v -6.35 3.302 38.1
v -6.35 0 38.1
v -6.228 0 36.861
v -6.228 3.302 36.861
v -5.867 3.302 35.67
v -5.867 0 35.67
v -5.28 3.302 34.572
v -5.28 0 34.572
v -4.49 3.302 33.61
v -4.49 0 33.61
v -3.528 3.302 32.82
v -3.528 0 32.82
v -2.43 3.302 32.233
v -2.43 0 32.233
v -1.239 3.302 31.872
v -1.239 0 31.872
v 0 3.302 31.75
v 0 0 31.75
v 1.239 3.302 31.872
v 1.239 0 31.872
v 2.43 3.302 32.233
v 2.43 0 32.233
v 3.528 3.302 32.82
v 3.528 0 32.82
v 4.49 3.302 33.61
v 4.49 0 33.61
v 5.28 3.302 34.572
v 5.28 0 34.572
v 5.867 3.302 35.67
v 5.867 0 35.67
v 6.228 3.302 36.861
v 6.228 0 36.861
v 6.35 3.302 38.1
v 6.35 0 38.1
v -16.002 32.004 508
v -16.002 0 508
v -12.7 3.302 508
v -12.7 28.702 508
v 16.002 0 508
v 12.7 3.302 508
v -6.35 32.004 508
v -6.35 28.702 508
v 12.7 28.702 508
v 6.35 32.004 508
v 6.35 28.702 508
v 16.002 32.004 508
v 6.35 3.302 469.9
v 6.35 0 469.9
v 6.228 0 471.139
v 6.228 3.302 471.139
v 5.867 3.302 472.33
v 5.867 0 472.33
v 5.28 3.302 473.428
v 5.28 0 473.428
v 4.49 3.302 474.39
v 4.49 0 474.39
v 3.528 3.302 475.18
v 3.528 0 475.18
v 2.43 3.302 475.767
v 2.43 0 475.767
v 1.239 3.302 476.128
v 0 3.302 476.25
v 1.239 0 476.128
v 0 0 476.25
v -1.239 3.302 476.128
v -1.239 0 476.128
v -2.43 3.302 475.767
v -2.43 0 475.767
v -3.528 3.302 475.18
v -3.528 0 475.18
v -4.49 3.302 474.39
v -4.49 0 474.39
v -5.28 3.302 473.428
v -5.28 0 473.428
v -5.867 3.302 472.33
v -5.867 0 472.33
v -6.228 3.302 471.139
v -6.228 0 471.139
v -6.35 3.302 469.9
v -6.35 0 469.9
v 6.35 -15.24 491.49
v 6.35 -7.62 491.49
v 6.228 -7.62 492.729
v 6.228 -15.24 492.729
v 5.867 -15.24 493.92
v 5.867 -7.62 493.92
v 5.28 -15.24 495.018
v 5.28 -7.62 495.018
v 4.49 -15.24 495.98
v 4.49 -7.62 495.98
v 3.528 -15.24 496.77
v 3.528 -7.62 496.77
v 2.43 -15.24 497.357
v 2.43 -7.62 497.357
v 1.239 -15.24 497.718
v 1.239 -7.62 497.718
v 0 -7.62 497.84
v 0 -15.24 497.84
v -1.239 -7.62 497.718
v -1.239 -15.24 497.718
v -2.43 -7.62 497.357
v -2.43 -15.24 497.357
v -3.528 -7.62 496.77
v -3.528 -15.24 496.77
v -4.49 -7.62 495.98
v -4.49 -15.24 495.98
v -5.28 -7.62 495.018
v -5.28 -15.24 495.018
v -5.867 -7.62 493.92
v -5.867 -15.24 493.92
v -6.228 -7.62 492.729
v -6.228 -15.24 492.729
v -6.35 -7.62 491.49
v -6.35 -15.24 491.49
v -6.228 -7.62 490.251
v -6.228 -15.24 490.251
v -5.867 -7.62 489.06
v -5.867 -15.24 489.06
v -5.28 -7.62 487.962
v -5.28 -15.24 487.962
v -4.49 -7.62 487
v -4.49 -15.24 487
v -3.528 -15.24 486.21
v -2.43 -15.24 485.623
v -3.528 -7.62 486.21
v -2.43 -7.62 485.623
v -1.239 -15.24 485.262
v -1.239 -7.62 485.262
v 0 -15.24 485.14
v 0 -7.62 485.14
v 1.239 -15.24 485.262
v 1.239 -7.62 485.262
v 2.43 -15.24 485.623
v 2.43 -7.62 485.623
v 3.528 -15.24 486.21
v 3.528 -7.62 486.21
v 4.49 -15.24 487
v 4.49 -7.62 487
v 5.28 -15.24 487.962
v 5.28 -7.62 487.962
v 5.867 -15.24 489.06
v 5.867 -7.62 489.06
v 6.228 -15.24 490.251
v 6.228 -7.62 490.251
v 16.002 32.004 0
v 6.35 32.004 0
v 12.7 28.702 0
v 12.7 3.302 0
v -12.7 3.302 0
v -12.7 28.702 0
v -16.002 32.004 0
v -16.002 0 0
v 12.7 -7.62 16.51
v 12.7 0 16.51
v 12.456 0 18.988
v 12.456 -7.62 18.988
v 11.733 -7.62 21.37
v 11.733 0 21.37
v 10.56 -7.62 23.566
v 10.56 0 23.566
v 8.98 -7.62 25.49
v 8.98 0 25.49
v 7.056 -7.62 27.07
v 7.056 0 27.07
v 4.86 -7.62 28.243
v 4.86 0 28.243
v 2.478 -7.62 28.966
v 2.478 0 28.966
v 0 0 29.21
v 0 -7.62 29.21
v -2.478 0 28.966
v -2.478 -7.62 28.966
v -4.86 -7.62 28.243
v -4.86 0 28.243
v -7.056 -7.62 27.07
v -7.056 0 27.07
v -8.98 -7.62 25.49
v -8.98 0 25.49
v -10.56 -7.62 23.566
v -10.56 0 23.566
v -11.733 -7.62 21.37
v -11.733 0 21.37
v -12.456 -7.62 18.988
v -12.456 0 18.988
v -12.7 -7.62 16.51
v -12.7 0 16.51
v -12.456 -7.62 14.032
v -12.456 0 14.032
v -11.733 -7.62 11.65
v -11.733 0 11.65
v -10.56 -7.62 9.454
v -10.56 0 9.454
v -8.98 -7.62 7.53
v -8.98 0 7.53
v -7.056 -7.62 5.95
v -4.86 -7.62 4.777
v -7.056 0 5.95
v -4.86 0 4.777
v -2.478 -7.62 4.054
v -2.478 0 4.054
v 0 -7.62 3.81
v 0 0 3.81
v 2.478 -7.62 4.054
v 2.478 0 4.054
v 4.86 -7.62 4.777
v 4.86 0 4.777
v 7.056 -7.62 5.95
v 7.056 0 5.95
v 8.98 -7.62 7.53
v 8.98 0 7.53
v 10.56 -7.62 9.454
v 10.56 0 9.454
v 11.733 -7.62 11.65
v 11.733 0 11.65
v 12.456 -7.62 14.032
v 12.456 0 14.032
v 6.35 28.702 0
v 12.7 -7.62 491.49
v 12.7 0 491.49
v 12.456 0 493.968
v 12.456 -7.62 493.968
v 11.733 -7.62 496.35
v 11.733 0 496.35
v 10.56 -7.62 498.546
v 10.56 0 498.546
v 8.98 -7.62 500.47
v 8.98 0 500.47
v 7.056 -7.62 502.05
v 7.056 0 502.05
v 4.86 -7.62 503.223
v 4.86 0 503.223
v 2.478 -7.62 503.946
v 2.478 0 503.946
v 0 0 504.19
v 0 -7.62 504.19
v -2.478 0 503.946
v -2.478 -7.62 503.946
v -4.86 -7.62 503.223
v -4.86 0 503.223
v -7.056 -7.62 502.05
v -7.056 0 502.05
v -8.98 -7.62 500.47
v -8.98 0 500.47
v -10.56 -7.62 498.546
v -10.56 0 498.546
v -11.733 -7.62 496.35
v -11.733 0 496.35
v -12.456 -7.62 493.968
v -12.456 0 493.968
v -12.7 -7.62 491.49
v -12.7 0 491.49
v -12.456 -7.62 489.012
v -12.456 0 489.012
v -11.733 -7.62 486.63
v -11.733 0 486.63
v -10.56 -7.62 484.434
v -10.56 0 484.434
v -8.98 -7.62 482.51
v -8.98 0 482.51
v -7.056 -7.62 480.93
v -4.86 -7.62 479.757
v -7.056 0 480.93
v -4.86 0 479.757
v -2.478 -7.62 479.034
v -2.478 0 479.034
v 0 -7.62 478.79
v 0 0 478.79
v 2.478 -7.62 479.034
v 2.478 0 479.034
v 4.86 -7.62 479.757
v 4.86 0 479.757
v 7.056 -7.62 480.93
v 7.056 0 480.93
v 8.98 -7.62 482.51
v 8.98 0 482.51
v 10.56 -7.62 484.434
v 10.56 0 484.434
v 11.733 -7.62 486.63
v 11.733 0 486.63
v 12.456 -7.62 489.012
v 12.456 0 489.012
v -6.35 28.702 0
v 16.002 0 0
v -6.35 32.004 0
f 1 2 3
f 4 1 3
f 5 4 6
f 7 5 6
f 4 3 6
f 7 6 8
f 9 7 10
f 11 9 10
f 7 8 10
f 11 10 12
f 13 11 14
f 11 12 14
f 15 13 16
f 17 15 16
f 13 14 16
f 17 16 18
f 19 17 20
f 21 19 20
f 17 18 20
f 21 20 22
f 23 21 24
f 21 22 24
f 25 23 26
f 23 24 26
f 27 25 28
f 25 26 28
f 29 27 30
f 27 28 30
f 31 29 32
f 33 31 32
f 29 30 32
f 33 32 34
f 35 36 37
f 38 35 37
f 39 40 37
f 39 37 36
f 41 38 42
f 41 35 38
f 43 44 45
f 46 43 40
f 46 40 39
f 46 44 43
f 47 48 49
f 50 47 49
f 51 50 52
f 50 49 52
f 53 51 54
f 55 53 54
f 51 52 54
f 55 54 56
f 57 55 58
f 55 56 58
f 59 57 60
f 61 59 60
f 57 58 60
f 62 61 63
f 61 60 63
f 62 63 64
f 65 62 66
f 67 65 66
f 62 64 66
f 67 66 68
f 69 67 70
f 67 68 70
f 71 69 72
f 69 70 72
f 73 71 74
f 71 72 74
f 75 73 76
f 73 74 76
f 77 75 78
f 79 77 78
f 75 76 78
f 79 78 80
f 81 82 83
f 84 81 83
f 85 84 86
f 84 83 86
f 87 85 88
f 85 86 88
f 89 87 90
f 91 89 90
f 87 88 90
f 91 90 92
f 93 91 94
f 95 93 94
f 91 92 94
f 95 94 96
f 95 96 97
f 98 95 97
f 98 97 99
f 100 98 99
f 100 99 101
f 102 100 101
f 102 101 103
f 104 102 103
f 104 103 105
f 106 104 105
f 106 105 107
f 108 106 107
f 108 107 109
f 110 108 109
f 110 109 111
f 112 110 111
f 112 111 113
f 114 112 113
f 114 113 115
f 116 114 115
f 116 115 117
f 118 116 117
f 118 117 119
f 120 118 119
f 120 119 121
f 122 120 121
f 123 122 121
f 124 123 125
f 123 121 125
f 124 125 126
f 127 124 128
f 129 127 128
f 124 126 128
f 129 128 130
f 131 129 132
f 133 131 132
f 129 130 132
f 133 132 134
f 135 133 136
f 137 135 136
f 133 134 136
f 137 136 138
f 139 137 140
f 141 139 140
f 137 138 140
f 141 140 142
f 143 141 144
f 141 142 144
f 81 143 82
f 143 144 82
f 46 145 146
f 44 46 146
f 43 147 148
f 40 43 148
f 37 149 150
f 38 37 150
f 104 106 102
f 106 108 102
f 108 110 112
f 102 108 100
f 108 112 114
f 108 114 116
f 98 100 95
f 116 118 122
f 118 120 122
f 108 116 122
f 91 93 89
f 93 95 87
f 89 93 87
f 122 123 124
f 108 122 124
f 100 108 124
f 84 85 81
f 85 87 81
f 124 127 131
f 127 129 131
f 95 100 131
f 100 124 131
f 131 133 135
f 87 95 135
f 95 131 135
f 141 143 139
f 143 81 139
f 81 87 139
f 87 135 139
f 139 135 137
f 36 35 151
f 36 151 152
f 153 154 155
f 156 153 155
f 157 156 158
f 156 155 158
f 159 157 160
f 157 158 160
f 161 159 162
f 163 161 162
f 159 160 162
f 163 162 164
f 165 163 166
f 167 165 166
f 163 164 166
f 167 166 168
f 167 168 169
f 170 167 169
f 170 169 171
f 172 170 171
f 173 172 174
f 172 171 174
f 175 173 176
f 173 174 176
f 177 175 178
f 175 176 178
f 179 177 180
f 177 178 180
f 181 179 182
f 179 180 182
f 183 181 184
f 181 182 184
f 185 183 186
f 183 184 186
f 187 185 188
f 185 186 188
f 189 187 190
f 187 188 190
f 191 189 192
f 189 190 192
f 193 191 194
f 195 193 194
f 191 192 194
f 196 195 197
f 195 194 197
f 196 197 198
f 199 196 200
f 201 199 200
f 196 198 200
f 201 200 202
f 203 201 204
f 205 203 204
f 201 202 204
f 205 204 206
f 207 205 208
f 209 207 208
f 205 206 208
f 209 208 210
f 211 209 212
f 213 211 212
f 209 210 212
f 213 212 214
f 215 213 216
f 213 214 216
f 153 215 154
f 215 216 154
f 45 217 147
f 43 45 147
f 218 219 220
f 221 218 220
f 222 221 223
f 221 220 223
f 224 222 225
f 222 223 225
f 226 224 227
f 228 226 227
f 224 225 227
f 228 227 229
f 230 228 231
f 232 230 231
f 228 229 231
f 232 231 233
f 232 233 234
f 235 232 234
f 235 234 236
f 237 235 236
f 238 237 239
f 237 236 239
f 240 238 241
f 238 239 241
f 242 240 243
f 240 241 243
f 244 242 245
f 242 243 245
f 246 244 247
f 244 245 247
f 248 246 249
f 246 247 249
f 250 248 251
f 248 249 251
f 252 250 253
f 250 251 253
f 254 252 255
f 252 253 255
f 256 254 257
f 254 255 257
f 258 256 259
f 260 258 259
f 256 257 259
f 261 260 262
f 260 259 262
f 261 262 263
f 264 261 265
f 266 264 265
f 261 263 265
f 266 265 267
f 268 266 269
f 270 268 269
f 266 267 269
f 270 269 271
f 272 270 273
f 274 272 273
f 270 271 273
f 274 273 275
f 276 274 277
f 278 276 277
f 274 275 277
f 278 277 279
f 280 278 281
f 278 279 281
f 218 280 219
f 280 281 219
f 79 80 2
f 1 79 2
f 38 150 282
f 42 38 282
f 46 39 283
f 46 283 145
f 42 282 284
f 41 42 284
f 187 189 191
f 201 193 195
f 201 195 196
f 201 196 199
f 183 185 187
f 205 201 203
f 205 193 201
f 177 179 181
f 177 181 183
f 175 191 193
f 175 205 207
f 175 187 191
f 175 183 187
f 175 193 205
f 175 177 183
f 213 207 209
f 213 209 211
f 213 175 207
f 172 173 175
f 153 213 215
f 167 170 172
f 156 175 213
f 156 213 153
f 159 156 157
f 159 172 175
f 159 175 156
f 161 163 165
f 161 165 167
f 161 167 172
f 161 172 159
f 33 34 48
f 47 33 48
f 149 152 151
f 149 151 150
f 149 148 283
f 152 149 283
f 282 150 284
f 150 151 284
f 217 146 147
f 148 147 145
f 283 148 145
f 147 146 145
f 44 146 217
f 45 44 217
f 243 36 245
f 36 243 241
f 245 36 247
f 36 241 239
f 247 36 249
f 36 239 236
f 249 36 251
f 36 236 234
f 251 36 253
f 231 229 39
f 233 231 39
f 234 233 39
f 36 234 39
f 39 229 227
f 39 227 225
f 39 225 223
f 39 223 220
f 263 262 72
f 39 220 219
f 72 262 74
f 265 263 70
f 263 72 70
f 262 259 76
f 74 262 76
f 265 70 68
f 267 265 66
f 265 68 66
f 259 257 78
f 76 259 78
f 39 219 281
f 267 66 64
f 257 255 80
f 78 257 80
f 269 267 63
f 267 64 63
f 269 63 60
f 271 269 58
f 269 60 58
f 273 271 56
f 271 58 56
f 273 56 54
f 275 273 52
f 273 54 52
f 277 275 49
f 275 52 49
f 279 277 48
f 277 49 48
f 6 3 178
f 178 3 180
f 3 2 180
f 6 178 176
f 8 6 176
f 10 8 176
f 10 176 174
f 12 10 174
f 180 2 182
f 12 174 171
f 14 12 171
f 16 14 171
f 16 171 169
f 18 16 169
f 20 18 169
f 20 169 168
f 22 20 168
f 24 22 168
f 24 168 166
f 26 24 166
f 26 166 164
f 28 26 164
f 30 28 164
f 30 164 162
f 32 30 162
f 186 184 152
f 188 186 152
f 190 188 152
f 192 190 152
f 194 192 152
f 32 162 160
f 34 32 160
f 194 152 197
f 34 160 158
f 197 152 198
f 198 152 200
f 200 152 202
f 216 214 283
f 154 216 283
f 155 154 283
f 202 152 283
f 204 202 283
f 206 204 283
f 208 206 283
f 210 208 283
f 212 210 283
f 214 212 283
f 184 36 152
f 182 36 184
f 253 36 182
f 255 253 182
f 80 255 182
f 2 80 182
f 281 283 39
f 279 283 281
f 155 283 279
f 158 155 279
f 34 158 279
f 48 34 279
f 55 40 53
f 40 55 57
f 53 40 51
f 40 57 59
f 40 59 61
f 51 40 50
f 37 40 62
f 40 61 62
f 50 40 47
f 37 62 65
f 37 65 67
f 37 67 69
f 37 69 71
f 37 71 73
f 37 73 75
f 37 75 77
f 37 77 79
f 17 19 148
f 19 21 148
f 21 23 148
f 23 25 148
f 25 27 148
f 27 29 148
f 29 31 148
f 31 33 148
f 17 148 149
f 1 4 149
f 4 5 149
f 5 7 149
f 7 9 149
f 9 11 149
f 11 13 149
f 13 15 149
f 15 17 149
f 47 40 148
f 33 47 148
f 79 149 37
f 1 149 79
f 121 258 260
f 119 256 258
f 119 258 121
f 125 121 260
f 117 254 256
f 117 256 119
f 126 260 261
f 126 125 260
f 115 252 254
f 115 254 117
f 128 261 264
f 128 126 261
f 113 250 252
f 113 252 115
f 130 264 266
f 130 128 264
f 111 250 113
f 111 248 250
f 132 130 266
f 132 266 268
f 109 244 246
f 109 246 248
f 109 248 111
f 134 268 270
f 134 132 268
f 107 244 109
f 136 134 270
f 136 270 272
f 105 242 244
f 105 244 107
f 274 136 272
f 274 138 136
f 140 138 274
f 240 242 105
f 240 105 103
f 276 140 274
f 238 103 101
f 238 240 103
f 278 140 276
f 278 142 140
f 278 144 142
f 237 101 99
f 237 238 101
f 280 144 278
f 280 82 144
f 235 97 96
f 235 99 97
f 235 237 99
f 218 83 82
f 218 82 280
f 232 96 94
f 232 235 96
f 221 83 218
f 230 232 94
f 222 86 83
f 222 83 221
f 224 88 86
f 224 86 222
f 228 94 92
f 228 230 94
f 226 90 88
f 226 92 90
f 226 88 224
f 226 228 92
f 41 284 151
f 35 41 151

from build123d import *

# Parameters (mm, degrees)
F1_DEPTH = 508
F2_R     = 12.7
F2_R_2   = 6.35
F3_DEPTH = 7.62
F4_DEPTH = 15.24
F6_DEPTH = 3.302


with BuildPart() as f1:
    # F0 (on Top) → F1 (new body)
    with BuildSketch(Plane.XY):
        Polygon((-16.002, 32.004), (-16.002, 0), (0, 0), (16.002, 0), (16.002, 32.004), (6.35, 32.004), (6.35, 28.702), (12.7, 28.702), (12.7, 3.302), (0, 3.302), (-12.7, 3.302), (-12.7, 28.702), (-6.35, 28.702), (-6.35, 32.004), align=None)
    extrude(amount=F1_DEPTH)

    # F2 (on face) → F3 (join)
    with BuildSketch(Plane.XZ):
        with Locations((0, 491.49)):
            Circle(F2_R)
        with Locations((0, 491.49)):
            Circle(F2_R_2, mode=Mode.SUBTRACT)
        with Locations((0, 16.51)):
            Circle(F2_R)
    extrude(amount=F3_DEPTH)

    # F4 (add): a face of the model
    f4_faces = [f1.faces().sort_by_distance(p)[0] for p in [
        (0, 0, 491.49),
    ]]
    extrude(f4_faces, amount=F4_DEPTH)

    # F5 (on face) → F6 (cut, through all)
    with BuildSketch(Plane.XZ):
        with BuildLine():
            Line((-6.35, 469.9), (-6.35, 38.1))
            ThreePointArc((-6.35, 38.1), (0, 31.75), (6.35, 38.1))
            Line((6.35, 38.1), (6.35, 469.9))
            ThreePointArc((6.35, 469.9), (0, 476.25), (-6.35, 469.9))
        make_face()
    extrude(amount=-F6_DEPTH, mode=Mode.SUBTRACT)


solid = f1.part
